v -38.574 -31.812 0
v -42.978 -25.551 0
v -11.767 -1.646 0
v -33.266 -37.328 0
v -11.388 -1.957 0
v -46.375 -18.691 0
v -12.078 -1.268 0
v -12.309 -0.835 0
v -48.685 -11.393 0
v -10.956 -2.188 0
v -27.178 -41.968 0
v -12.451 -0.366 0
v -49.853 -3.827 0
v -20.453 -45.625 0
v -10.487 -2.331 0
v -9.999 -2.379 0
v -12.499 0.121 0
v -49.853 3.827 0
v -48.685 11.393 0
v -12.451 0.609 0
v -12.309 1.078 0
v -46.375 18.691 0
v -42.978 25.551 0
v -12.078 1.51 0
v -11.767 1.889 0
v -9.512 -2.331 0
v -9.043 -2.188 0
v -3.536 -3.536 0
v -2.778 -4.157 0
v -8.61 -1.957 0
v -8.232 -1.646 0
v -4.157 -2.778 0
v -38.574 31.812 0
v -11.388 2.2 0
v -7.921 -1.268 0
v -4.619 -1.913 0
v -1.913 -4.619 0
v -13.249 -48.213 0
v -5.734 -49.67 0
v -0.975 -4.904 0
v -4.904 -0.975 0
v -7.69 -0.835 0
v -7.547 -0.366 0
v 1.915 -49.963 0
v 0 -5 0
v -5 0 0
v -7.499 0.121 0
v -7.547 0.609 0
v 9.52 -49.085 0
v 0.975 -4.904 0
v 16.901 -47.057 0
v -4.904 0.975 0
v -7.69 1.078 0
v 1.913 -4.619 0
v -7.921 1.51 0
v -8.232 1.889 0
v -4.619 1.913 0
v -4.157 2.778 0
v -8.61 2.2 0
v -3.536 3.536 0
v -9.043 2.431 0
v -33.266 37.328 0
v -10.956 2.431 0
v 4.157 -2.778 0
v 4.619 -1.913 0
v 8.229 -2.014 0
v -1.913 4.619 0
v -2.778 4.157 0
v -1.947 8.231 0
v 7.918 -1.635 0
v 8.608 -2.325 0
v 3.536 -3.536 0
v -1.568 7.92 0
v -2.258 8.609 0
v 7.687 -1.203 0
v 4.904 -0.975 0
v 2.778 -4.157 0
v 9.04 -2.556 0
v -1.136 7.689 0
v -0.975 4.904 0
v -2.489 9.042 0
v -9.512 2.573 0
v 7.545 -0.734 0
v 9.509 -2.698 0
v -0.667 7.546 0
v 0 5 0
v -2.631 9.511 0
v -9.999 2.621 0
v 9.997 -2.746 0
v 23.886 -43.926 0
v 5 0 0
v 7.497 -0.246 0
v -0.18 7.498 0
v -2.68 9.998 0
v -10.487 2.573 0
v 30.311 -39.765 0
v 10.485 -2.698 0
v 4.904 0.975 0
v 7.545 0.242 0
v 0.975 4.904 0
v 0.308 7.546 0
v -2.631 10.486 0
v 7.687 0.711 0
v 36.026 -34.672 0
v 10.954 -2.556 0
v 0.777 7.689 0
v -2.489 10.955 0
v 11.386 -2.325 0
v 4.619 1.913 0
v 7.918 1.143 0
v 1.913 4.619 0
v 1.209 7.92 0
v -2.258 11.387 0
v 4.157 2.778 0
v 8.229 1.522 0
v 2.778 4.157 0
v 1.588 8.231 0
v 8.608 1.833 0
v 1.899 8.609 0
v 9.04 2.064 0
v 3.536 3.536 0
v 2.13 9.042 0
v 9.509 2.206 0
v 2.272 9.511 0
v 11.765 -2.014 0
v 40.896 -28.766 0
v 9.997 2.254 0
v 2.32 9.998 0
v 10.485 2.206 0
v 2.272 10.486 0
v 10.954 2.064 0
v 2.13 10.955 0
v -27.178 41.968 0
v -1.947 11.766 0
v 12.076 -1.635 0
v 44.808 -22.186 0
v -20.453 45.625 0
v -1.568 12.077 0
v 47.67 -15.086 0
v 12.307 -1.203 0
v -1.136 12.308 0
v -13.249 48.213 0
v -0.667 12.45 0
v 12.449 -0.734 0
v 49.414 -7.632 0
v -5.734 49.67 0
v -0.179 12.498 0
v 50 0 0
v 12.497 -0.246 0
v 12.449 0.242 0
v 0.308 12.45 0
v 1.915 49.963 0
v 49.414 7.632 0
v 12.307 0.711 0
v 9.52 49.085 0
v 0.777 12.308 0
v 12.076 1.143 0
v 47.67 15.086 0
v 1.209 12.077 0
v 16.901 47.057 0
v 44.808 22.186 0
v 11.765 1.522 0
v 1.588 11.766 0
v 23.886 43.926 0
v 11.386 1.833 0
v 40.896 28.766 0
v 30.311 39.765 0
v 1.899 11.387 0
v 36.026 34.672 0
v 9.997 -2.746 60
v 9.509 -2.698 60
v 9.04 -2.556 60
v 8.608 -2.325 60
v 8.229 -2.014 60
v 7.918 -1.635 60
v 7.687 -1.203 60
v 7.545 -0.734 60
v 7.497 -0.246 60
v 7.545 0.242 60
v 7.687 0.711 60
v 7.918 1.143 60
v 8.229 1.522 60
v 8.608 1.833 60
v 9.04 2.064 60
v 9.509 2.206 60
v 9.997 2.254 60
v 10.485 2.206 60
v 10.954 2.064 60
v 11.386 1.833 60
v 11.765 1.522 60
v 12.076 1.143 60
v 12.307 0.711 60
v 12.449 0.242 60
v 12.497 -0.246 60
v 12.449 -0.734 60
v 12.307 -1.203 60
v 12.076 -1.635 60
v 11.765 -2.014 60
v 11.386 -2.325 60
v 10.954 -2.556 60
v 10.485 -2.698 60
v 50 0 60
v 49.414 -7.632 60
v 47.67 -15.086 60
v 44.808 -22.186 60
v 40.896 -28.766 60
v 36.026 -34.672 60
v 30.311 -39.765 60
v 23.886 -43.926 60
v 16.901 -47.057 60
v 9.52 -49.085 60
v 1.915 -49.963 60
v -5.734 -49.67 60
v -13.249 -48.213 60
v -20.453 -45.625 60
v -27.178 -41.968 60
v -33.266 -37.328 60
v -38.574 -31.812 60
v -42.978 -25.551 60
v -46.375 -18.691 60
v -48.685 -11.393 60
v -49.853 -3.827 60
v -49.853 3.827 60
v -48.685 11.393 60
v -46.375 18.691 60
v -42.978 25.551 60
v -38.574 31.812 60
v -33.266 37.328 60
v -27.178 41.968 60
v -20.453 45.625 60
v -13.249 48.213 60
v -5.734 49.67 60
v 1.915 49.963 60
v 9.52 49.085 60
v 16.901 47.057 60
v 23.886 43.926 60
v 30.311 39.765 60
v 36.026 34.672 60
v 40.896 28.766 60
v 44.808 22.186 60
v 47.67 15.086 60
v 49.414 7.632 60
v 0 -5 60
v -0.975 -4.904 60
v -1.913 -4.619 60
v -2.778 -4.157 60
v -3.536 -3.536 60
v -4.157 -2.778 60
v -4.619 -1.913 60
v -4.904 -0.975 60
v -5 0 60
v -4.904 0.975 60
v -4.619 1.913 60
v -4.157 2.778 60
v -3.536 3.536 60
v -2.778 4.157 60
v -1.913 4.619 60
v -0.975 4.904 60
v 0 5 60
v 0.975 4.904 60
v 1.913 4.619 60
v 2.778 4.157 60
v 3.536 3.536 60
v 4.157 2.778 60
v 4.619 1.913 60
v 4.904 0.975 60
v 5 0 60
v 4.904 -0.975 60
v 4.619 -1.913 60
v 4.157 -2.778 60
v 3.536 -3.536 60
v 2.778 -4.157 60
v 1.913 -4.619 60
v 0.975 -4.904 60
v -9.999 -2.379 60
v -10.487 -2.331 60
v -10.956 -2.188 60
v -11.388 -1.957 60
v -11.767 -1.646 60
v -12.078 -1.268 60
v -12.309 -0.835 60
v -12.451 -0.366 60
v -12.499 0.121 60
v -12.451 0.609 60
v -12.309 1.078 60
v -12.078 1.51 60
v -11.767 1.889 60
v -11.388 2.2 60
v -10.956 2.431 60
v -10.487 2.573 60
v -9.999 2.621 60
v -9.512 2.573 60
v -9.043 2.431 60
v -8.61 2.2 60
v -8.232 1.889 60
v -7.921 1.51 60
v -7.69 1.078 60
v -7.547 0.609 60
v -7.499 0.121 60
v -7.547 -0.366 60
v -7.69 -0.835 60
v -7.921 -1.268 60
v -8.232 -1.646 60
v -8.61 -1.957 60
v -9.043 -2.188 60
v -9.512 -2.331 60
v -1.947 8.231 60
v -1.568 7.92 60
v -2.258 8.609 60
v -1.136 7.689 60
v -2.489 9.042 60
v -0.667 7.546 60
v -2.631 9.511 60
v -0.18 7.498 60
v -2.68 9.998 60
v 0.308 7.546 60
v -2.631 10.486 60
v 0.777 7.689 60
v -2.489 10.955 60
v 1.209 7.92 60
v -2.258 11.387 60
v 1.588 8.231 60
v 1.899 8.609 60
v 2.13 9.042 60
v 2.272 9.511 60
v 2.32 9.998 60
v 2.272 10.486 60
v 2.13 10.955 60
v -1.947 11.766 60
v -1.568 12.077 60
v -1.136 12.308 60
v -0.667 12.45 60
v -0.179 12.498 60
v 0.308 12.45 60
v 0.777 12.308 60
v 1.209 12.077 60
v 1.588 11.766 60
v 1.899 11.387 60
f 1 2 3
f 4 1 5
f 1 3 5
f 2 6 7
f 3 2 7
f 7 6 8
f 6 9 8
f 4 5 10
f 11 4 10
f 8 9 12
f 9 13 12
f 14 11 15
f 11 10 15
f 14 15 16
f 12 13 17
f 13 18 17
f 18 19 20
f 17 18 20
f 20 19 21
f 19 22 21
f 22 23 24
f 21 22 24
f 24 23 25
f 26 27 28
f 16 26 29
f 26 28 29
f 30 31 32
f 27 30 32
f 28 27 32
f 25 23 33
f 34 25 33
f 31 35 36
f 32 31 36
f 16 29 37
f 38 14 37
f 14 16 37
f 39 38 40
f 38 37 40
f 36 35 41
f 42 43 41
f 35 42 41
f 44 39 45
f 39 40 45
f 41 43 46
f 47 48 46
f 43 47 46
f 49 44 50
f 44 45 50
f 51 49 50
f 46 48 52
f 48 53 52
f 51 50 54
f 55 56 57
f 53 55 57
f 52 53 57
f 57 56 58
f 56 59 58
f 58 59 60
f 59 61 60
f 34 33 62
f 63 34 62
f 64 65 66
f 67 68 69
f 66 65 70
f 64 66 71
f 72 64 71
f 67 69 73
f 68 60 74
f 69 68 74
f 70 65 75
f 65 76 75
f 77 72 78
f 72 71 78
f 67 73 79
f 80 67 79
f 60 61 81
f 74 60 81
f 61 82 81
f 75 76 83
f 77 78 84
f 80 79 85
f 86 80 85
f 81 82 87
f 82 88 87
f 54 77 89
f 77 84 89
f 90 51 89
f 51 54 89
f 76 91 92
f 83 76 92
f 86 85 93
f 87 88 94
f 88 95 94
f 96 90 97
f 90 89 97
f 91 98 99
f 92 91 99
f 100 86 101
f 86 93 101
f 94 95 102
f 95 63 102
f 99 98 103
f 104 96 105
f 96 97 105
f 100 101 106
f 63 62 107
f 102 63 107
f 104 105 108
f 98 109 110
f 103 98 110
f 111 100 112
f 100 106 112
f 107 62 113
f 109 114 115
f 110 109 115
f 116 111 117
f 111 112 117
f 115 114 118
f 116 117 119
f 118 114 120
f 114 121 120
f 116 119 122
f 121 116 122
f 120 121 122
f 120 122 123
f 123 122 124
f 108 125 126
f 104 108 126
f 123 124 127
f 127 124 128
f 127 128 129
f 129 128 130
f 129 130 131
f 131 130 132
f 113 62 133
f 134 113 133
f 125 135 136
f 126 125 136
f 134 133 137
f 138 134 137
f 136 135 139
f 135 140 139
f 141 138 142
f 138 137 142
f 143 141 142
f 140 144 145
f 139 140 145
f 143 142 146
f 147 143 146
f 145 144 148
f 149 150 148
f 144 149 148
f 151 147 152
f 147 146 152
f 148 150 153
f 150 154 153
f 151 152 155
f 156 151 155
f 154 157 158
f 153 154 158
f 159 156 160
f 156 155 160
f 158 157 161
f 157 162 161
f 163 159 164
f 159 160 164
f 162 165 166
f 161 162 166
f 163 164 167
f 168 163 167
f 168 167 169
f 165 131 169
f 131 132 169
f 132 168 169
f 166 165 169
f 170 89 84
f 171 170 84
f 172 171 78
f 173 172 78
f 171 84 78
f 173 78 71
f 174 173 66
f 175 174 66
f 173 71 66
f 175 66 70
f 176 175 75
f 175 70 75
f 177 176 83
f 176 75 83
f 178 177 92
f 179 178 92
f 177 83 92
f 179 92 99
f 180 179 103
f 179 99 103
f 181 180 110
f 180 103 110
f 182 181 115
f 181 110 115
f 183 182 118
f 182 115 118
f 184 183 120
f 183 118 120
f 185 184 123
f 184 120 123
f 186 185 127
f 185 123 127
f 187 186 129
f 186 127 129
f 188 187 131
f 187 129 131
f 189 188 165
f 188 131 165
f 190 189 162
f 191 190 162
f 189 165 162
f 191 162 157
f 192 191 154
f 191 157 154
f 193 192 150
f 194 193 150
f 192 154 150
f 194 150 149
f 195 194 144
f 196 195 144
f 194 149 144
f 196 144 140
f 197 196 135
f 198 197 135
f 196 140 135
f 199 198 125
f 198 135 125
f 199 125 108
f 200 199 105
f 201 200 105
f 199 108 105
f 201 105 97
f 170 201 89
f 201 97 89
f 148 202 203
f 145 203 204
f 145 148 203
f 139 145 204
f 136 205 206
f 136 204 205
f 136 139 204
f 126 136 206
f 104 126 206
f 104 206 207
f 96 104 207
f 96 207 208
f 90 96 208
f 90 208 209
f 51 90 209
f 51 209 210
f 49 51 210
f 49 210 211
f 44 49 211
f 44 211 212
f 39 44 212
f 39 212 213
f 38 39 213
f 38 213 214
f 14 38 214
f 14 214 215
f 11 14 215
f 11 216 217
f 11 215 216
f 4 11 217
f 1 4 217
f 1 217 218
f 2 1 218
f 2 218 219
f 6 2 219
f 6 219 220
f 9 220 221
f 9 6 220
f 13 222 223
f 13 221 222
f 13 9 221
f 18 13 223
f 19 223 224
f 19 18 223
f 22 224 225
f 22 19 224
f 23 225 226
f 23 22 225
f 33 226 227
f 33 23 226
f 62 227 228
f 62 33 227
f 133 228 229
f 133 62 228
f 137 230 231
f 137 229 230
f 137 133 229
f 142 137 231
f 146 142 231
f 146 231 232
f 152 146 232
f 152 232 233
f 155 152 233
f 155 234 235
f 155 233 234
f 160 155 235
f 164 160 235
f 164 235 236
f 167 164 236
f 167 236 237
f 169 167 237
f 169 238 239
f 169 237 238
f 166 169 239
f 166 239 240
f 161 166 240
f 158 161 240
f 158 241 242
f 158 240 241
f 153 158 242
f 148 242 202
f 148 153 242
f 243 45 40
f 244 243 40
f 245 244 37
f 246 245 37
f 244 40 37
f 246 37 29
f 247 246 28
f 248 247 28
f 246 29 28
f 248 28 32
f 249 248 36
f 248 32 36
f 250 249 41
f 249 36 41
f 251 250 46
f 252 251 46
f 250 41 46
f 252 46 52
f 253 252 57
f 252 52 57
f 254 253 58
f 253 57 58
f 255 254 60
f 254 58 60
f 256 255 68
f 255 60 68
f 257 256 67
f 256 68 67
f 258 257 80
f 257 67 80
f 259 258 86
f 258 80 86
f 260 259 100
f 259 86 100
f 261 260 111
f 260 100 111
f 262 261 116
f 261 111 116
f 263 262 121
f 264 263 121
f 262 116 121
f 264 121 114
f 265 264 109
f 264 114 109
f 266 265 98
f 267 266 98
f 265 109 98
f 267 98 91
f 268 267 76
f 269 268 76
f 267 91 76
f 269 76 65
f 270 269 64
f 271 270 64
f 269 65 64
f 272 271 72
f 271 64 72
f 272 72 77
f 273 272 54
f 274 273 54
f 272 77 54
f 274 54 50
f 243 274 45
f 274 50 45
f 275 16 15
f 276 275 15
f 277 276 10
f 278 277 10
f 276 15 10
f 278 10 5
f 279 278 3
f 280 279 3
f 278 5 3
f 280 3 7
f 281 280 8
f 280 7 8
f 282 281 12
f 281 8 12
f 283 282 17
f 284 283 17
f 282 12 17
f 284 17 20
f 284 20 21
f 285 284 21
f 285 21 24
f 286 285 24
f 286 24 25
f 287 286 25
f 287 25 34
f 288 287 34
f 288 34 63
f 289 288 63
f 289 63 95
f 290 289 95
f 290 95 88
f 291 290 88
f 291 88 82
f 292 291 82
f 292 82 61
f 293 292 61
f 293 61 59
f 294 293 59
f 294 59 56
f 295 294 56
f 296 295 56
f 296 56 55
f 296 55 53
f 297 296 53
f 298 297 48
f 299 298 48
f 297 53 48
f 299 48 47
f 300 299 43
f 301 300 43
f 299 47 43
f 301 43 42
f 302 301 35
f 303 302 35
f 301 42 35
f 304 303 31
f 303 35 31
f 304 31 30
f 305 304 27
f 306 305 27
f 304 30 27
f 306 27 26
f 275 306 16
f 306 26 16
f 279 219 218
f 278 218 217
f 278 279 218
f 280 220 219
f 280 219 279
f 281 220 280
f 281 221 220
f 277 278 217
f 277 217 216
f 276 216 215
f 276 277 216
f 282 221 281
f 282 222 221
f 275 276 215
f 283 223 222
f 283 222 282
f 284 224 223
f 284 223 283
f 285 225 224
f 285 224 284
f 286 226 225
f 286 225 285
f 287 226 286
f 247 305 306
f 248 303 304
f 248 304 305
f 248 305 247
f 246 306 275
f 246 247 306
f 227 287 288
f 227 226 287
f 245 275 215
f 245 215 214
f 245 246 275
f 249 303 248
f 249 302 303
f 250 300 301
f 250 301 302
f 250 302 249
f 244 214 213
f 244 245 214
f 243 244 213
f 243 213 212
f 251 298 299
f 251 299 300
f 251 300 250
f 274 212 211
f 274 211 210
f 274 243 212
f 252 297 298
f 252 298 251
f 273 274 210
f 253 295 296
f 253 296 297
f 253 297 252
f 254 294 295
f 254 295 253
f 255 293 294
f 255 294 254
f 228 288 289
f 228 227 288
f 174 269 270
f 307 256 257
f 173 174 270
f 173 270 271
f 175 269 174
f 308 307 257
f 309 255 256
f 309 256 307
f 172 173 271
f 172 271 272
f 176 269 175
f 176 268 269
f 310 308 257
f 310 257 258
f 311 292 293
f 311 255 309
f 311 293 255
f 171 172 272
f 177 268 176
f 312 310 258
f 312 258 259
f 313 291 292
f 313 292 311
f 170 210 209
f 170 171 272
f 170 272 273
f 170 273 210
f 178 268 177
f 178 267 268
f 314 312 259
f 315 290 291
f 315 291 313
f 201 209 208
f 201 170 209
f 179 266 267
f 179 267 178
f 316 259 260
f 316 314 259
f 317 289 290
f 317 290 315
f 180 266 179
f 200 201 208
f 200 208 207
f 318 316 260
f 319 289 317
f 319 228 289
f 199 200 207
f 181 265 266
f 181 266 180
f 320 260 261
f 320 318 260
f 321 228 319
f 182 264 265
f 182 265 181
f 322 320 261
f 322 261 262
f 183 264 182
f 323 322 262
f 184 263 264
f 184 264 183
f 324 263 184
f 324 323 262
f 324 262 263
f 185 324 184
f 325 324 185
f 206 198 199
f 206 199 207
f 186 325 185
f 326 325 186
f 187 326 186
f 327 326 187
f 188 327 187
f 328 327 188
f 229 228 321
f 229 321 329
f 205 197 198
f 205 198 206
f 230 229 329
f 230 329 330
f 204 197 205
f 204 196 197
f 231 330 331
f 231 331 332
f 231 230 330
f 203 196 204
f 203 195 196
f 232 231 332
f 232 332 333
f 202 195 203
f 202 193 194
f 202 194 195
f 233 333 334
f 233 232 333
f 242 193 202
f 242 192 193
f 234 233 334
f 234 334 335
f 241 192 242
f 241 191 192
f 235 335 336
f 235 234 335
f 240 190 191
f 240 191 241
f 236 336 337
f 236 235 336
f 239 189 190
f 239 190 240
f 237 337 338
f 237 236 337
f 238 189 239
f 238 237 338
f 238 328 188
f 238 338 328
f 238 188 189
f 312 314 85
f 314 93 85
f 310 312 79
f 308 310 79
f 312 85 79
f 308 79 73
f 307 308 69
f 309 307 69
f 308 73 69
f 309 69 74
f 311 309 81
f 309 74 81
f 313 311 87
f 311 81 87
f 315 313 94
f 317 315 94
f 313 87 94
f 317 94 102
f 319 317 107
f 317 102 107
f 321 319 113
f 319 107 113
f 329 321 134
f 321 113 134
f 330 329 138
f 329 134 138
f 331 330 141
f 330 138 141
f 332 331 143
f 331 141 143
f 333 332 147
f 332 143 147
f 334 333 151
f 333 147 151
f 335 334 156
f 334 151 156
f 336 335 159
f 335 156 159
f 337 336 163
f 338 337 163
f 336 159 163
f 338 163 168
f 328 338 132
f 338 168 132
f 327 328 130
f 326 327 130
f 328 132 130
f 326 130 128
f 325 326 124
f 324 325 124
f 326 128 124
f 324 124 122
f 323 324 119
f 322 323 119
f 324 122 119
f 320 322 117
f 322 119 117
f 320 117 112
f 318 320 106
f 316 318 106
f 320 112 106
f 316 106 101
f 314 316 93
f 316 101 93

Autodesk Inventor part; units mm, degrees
ref_plane "YZ Plane" through (0, 0, 0) normal (1, 0, 0) x (0, 1, 0)
ref_plane "XZ Plane" through (0, 0, 0) normal (0, 1, 0) x (-1, 0, 0)
ref_plane "XY Plane" through (0, 0, 0) normal (0, 0, 1) x (1, 0, 0)
sketch "スケッチ1" plane through (0, 0, 0) normal (0, 0, 1) x (1, 0, 0)
  circle A0 centre (0, 0) radius 50
  dimension "d0" = 100
extrude "押し出し1" add sketch "スケッチ1" along normal blind 60
sketch "スケッチ2" plane through (0, 0, 60) normal (0, 0, 1) x (1, 0, 0)
  point P0 (0, 0)
  point P1 (0, 0)
hole "穴1" at (0, 0, 60) direction (0, 0, -1) diameter 10 depth 60 tip angle 118
sketch "スケッチ3" plane through (0, 0, 60) normal (0, 0, 1) x (1, 0, 0)
  circle A0 centre (0, 0) radius 5 projected
  circle A1 centre (0, 0) radius 10 construction
  point P0 (-9.9993, 0.1214)
  point P1 (-0.1795, 9.9984)
  point P2 (9.997, -0.246)
  dimension "d17" = 20
hole "穴2" at (-9.9993, 0.1214, 60) at (-0.1795, 9.9984, 60) at (9.997, -0.246, 60) direction (0, 0, -1) diameter 5 depth 60 tip angle 118
properties part number "ローラー"
